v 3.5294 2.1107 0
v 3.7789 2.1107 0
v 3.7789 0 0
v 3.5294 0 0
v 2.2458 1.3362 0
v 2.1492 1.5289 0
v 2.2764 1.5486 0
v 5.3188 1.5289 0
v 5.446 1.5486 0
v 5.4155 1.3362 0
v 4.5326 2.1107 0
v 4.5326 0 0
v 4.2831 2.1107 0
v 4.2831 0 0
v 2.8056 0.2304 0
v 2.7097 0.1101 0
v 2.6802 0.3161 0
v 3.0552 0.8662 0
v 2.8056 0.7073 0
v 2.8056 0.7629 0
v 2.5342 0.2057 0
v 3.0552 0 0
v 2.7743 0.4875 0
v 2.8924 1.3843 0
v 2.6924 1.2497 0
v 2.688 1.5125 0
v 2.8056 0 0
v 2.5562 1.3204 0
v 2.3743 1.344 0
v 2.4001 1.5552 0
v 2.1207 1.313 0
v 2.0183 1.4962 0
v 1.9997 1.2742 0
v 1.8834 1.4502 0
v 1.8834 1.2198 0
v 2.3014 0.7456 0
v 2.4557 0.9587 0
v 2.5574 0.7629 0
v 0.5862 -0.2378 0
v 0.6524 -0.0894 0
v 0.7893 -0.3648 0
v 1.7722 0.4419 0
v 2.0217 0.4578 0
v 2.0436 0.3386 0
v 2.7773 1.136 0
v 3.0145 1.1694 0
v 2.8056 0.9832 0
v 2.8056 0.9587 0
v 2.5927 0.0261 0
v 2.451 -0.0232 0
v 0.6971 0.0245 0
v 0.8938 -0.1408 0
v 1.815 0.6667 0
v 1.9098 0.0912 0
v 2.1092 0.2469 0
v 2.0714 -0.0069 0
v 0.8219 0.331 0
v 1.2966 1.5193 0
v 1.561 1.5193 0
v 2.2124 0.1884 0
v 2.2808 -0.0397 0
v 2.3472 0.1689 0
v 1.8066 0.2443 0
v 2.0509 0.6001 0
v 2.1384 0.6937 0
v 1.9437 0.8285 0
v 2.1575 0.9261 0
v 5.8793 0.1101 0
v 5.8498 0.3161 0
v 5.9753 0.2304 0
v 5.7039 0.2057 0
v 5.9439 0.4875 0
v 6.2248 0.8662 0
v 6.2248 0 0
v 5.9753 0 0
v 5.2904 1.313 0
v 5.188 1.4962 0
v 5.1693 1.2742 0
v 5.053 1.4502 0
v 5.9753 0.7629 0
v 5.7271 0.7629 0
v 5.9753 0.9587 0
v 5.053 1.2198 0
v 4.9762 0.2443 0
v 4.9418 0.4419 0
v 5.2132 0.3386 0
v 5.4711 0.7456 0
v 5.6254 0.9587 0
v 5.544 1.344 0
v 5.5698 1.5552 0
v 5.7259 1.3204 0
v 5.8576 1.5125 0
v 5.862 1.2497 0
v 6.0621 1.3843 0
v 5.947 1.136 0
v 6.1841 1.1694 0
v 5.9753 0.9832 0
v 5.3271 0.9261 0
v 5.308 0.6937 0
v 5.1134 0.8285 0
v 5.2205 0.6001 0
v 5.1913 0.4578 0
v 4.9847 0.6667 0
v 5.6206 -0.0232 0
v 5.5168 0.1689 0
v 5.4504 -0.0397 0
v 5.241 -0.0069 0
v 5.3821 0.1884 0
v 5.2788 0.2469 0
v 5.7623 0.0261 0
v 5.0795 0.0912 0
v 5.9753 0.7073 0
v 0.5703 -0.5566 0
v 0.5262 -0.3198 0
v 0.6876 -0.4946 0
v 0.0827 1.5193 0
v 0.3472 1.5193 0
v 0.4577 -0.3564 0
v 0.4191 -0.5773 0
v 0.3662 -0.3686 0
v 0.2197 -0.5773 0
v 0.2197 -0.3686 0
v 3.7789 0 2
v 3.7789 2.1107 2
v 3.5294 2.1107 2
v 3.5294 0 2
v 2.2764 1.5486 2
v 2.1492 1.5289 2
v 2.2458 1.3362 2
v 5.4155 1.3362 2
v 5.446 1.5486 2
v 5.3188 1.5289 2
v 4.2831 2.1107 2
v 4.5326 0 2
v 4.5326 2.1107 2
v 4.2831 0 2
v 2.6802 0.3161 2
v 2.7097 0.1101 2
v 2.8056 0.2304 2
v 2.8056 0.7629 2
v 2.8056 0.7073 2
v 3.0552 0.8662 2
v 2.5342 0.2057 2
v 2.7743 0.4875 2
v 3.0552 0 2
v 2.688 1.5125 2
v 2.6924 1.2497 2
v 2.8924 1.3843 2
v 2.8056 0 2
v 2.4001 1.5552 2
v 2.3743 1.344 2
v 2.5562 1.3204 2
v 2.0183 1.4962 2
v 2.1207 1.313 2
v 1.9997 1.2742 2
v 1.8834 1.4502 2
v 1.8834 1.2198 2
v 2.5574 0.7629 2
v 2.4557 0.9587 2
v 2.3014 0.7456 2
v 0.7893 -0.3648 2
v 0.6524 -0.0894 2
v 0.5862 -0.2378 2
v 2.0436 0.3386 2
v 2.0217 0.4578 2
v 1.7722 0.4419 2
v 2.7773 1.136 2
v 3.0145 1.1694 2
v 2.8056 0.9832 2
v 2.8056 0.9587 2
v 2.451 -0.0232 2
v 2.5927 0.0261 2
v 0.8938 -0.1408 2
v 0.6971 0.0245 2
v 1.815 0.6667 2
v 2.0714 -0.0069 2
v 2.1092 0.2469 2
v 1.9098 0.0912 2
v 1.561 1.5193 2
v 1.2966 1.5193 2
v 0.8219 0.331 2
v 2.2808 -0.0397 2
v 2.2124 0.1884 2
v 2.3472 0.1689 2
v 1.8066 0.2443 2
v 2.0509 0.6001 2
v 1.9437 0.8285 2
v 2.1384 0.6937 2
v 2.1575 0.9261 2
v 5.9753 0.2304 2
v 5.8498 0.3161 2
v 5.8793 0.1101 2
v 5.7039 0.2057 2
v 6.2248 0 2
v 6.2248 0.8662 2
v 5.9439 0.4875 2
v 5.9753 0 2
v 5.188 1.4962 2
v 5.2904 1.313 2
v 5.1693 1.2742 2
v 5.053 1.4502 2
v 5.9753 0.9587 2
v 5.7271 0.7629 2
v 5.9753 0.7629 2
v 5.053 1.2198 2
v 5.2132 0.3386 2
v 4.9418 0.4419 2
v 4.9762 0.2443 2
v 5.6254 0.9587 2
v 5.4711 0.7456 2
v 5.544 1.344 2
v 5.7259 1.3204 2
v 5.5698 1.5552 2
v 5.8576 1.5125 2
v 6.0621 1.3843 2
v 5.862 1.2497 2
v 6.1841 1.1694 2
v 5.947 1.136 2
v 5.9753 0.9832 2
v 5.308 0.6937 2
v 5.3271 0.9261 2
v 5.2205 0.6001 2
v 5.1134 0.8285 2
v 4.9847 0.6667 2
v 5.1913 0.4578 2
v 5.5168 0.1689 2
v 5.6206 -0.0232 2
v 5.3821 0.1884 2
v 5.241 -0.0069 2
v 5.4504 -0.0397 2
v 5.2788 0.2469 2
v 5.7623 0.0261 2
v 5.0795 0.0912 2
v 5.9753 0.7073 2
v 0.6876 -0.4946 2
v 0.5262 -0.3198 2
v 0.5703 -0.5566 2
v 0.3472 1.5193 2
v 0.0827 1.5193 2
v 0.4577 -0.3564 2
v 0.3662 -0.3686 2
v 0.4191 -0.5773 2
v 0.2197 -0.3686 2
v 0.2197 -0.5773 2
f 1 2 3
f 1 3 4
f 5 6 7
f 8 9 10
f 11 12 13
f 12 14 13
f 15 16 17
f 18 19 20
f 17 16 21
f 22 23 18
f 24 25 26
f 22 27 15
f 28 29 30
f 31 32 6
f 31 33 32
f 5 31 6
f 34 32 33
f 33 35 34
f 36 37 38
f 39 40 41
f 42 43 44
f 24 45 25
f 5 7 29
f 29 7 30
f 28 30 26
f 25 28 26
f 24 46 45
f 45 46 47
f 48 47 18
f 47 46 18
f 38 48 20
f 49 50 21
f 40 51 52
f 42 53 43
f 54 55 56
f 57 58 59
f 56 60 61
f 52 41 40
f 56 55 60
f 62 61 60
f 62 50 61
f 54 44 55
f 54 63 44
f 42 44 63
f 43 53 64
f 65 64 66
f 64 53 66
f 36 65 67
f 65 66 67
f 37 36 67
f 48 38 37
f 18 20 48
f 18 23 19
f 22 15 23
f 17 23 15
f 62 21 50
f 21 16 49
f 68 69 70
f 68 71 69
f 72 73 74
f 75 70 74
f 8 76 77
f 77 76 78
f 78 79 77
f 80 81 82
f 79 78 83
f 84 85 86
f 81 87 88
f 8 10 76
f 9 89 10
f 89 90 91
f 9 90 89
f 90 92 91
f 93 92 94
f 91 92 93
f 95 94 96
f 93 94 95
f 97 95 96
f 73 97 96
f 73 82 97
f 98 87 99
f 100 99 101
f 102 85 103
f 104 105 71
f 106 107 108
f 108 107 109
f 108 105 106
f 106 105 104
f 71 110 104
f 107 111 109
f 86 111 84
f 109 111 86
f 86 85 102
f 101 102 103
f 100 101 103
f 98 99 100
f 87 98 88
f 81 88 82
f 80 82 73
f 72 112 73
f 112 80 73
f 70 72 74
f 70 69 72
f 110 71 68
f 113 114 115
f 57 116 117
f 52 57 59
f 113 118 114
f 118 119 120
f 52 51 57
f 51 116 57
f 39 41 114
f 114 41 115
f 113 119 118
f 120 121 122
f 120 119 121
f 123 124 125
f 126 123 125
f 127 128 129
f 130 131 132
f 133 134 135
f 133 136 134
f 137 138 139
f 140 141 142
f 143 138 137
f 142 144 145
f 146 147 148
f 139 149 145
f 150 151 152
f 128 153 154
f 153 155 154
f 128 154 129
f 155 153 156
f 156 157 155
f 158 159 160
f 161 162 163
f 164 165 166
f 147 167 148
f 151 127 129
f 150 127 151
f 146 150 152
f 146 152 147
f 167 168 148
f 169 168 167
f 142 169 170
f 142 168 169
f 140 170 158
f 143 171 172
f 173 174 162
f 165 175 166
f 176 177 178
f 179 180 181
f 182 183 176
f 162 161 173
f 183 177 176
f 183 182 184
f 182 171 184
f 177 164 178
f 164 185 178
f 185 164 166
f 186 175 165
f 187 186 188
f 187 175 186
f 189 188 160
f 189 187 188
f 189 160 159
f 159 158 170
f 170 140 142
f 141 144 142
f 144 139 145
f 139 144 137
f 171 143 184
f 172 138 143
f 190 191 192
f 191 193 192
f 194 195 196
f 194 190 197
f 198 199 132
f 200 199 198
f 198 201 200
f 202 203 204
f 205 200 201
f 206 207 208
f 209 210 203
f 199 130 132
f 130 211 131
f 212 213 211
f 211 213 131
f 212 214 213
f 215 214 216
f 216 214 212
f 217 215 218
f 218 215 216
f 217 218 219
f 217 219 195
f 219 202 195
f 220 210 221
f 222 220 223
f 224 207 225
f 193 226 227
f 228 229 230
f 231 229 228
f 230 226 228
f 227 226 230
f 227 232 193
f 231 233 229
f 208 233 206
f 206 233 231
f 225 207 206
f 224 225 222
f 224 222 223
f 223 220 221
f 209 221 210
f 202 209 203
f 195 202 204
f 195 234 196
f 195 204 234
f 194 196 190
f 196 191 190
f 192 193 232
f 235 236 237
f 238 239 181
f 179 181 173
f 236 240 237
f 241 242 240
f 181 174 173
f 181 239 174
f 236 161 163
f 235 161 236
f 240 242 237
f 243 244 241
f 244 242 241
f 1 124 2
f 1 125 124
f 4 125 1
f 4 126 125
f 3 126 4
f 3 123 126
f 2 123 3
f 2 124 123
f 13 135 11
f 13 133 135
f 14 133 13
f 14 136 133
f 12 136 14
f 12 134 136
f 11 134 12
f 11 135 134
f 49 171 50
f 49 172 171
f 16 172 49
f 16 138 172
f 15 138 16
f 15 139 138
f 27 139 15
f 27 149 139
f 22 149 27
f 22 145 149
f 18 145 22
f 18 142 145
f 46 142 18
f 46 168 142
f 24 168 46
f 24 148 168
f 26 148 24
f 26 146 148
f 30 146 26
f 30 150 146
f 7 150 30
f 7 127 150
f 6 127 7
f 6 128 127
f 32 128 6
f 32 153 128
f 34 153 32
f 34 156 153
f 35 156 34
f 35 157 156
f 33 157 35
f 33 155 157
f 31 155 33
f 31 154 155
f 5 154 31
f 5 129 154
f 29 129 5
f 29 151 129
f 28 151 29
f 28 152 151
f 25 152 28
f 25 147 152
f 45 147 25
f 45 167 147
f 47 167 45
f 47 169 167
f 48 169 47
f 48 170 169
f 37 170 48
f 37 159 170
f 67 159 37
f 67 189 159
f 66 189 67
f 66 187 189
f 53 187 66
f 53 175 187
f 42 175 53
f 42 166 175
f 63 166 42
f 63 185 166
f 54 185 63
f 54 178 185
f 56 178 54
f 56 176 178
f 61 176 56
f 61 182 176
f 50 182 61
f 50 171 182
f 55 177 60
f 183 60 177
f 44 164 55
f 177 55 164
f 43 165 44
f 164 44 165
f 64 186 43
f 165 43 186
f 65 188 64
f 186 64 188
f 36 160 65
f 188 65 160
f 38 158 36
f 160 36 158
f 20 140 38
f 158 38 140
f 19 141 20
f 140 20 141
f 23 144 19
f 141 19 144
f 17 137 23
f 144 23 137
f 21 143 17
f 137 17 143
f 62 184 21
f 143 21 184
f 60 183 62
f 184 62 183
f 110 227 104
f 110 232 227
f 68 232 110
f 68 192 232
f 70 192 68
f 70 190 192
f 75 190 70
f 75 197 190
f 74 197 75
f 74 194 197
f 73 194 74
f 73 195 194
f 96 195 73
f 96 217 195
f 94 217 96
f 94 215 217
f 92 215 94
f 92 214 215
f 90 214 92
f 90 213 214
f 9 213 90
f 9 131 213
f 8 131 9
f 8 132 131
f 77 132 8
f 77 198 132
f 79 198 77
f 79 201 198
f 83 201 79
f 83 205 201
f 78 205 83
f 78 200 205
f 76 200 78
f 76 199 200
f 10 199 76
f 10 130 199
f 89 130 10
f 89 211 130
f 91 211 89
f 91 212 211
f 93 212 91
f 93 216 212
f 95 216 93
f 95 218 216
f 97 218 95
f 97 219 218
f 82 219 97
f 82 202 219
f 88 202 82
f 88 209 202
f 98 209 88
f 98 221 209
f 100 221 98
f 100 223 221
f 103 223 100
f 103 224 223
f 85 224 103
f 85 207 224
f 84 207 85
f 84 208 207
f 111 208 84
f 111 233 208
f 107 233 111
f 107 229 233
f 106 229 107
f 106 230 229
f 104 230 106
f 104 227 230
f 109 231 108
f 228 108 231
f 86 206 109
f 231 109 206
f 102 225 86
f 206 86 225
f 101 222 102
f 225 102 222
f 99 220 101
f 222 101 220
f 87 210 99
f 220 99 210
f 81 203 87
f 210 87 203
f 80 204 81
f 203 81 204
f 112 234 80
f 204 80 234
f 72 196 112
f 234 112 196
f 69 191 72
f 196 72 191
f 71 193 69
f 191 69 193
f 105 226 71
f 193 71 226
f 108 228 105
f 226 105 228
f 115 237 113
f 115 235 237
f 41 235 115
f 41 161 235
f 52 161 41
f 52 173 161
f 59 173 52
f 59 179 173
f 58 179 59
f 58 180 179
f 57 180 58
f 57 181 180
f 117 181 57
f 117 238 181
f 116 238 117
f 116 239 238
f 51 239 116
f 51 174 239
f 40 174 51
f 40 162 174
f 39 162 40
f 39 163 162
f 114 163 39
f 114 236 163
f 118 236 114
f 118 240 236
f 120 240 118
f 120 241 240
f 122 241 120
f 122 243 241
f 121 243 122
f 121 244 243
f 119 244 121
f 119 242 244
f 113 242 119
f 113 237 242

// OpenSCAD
texte_a_inserer = "yalla"; 
taille = 2; 
police = "Chewy"; //[[Abril Fatface,Aclonica,Acme,Advent Pro,Akronim,Aladin,Alegreya,Alegreya Sans,Alegreya SC,Alex Brush,Alfa Slab One,Alice,Amaranth,Architects Daughter,Archivo Black,Archivo Narrow,Arimo,Arvo,Asap,Astloch,Asul,Averia Libre,Averia Serif Libre,Bangers,Basic,Belgrano,Berkshire Swash,Bigshot One,Bilbo Swash Caps,Black Ops One,Bonbon,Bowlby One SC,Brawler,Bubblegum Sans,Butterfly Kids,Cabin Condensed,Caesar Dressing,Cagliostro,Calligraffitti,Capriola,Carter One,Changa One,Chango,Chelsea Market,Cherry Cream Soda,Chewy,Chicle,Chivo,Clicker Script,Coming Soon,Concert One,Condiment,Cookie,Courgette,Covered By Your Grace,Crimson Text,Dancing Script,DejaVu Sans,DejaVu Serif,Dhurjati,Doppio One,Dosis,Droid Sans,Eagle Lake,Electrolize,Emilys Candy,Encode Sans,Encode Sans Compressed,Euphoria Script,Exo,Exo 2,Faster One,Federo,Finger Paint,Fjord One,Fontdiner Swanky,Freckle Face,Fruktur,Gabriela,Geo,Germania One,Give You Glory,Gloria Hallelujah,Goudy Bookletter 1911,Graduate,Grand Hotel,Great Vibes,Griffy,Hanalei Fill,Happy Monkey,Henny Penny,Hind,IM Fell English SC,Indie Flower,Irish Grover,Italianno,Jacques Francois Shadow,Jolly Lodger,Josefin Slab,Joti One,Judson,Just Another Hand,Kalam,Kameron,Karma,Kavoon,Knewave,Kranky,Kristi,Laila,Lakki Reddy,Lancelot,Lato,Leckerli One,Ledger,Lekton,Lemon One,Liberation Sans,Libre Caslon Text,Life Savers,Lilita One,Lily Script One,Limelight,Lobster,Lobster Two,Londrina Outline,Londrina Shadow,Londrina Solid,Lora,Love Ya Like A Sister,Loved by the King,Lovers Quarrel,Luckiest Guy,Lusitana,Macondo,Macondo Swash Caps,Mako,Marck Script,Margarine,Marko One,Maven Pro,McLaren,MedievalSharp,Merienda One,Merriweather,Mervale Script,Metal Mania,Metrophobic,Milonga,Miltonian Tattoo,Miss Fajardose,Molle,Montez,Montserrat,Mr De Haviland,Mystery Quest,Neucha,New Rocker,Niconne,Nosifer,Nothing You Could Do,Noto Sans Oriya,Noto Serif,Nova Square,Nunito,Old Standard TT,Oleo Script,Oleo Script Swash Caps,Orbitron,Oregano,Orienta,Original Surfer,Oswald,Over the Rainbow,Overlock,Oxygen,Pacifico,Paprika,Parisienne,Patrick Hand SC,Paytone One,Peralta,Permanent Marker,Piedra,Pirata One,Play,Playball,Poetsen One,Poppins,Press Start 2P,Princess Sofia,PT Mono,Qwigley,Racing Sans One,Raleway,Rancho,Ranga,Ribeye,Roboto,Roboto Condensed,Roboto Slab,Rochester,Rock Salt,Rubik One,Sail,Salsa,Sansita One,Sarina,Satisfy,Schoolbell,Seaweed Script,Sevillana,Shadows Into Light,Shadows Into Light Two,Share,Six Caps,Skranji,Source Sans Pro,Spicy Rice,Stardos Stencil,Stoke,Syncopate,Teko,Terminal Dosis,The Girl Next Door,Tillana,Timmana,Titillium Web,Ubuntu,Ultra,Underdog,UnifrakturCook,UnifrakturMaguntia,Vampiro One,Vidaloka,Viga,Voces,Volkhov,Vollkorn,Voltaire,Waiting for the Sunrise,Wallpoet,Wellfleet,Wendy One,Yellowtail,Yesteryear,Zeyada]]
hauteur = 2; 
module rendu(){
linear_extrude(hauteur) text(texte_a_inserer,size = taille, font = police);
}
rendu();
 
